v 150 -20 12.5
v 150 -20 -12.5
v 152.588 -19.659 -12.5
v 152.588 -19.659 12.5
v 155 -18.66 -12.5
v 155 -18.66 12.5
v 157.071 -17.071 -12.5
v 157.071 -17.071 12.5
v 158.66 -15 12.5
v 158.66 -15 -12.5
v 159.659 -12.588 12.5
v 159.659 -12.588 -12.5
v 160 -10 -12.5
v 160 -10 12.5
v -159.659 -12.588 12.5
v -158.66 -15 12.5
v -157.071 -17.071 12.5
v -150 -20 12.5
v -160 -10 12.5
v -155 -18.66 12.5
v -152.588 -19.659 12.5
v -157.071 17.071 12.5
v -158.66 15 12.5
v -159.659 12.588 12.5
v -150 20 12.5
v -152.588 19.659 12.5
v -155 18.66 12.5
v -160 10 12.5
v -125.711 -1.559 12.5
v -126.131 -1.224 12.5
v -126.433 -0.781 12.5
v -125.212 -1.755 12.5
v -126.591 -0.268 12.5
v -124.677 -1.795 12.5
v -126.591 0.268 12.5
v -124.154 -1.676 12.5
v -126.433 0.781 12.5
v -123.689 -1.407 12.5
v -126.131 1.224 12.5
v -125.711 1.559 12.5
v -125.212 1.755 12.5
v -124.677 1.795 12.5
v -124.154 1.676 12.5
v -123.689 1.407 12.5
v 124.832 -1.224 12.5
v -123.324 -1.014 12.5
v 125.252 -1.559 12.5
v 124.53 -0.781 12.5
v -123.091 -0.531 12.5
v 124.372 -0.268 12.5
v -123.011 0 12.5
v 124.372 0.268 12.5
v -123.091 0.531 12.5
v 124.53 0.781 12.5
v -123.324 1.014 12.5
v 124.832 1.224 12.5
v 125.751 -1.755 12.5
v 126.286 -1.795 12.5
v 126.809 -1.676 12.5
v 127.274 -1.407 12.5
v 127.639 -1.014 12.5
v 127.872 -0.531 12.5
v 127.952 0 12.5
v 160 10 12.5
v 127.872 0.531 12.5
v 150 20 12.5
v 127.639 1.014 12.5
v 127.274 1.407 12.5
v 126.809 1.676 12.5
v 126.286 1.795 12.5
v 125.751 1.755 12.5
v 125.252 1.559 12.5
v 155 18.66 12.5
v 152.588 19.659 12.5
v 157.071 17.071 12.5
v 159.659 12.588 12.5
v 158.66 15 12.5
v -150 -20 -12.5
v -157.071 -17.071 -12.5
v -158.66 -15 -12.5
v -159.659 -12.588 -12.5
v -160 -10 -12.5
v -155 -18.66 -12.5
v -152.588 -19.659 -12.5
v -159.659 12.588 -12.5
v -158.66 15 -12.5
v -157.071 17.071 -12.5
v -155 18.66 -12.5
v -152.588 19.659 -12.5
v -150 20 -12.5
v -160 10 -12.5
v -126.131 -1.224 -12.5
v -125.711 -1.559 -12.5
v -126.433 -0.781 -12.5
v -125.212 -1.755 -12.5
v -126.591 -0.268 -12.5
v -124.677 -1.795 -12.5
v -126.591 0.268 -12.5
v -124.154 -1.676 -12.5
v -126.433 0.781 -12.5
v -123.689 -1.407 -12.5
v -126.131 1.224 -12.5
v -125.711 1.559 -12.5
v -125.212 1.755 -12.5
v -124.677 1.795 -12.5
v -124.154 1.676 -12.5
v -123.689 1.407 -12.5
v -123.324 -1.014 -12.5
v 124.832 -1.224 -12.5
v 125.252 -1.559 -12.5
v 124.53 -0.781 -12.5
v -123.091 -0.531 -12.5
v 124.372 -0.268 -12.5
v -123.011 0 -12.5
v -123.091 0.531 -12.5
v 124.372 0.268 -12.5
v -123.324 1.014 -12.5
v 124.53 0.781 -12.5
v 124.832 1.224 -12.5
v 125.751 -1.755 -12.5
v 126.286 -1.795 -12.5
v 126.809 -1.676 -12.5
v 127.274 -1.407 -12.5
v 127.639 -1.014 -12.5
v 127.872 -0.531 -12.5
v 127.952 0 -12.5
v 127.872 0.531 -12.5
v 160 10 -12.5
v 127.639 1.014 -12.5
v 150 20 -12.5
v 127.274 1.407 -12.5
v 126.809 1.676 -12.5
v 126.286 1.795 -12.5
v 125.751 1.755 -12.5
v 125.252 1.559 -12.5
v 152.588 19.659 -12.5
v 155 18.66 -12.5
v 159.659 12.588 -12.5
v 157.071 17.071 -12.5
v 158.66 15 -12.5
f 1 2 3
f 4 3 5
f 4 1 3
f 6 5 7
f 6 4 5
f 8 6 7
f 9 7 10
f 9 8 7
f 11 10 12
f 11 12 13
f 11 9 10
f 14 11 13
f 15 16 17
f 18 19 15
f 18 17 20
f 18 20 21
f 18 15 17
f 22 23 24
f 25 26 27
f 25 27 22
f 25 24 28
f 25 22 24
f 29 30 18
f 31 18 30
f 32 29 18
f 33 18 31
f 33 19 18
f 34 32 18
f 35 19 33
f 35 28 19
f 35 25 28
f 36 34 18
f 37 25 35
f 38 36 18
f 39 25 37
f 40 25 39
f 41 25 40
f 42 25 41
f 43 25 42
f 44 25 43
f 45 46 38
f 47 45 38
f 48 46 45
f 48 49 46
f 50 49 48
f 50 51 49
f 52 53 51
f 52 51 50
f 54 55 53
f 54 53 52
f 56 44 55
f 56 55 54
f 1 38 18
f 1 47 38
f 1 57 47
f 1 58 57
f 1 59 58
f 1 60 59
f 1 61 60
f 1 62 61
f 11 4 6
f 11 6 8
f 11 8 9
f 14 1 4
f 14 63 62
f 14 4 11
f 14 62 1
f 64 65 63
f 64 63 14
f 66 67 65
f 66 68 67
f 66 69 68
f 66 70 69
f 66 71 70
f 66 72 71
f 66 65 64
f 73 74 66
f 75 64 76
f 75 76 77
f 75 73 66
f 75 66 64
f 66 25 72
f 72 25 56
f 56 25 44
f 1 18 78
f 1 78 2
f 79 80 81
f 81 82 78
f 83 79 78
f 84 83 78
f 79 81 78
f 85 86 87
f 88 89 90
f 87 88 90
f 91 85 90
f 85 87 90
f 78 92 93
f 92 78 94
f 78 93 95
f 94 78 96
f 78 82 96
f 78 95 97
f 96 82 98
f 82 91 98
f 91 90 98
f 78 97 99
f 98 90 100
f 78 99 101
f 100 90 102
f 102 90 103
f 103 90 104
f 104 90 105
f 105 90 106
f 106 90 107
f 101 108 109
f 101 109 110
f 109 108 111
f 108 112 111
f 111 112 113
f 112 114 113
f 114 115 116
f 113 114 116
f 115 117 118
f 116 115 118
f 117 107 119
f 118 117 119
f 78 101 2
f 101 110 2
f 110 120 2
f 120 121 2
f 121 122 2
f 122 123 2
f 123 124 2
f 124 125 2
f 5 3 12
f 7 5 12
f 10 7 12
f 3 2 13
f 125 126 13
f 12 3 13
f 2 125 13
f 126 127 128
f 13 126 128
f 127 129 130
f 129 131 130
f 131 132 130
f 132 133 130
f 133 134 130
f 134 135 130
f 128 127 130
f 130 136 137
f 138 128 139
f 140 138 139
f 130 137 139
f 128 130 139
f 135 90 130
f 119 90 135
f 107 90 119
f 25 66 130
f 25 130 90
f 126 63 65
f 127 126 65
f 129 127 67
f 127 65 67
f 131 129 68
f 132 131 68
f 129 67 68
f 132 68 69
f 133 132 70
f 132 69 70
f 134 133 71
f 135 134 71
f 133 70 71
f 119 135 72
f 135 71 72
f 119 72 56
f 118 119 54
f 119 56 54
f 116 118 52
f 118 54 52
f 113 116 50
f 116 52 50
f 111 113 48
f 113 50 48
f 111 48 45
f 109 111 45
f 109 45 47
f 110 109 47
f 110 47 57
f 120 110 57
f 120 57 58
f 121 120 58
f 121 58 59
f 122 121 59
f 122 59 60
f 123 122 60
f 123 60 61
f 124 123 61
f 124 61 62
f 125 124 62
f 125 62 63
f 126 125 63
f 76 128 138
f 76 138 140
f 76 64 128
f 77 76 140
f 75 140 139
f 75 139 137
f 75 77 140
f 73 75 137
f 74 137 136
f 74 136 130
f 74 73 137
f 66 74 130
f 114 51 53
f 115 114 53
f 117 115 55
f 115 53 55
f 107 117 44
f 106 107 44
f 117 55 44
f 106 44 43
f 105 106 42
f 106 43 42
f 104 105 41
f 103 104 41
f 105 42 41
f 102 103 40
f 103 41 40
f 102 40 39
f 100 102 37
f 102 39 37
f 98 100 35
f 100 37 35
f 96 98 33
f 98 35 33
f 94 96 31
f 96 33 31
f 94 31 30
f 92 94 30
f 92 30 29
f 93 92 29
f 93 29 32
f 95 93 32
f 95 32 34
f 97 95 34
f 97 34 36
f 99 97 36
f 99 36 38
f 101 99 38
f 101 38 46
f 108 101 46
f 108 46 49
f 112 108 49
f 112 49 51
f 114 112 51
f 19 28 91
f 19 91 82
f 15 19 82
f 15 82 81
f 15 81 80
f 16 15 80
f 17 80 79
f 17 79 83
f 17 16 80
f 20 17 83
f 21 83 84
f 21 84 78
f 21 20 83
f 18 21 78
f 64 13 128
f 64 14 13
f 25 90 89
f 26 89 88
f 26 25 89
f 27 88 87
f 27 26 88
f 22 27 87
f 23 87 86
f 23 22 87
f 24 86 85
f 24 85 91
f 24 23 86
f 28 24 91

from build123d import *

# Parameters (mm, degrees)
F1_DEPTH = 12.5
F2_R     = 1.8
F3_DEPTH = 26
F4_R     = 1.8
F5_DEPTH = 26


with BuildPart() as f1:
    # F0 (on Top) → F1 (new body, symmetric)
    with BuildSketch(Plane.XY):
        with BuildLine():
            ThreePointArc((160, 10), (157.071068, 17.071068), (150, 20))
            Line((150, 20), (-150, 20))
            ThreePointArc((-150, 20), (-157.071068, 17.071068), (-160, 10))
            Line((-160, 10), (-160, -10))
            ThreePointArc((-160, -10), (-157.071068, -17.071068), (-150, -20))
            Line((-150, -20), (150, -20))
            ThreePointArc((150, -20), (157.071068, -17.071068), (160, -10))
            Line((160, -10), (160, 10))
        make_face()
    extrude(amount=F1_DEPTH, both=True)

    # F2 (on face) → F3 (cut)
    with BuildSketch(Plane.XY.offset(12.5)):
        with Locations((-124.811478, 0)):
            Circle(F2_R)
    extrude(amount=-F3_DEPTH, mode=Mode.SUBTRACT)

    # F4 (on face) → F5 (cut)
    with BuildSketch(Plane.XY.offset(12.5)):
        with Locations((126.15183, 0)):
            Circle(F4_R)
    extrude(amount=-F5_DEPTH, mode=Mode.SUBTRACT)


solid = f1.part
